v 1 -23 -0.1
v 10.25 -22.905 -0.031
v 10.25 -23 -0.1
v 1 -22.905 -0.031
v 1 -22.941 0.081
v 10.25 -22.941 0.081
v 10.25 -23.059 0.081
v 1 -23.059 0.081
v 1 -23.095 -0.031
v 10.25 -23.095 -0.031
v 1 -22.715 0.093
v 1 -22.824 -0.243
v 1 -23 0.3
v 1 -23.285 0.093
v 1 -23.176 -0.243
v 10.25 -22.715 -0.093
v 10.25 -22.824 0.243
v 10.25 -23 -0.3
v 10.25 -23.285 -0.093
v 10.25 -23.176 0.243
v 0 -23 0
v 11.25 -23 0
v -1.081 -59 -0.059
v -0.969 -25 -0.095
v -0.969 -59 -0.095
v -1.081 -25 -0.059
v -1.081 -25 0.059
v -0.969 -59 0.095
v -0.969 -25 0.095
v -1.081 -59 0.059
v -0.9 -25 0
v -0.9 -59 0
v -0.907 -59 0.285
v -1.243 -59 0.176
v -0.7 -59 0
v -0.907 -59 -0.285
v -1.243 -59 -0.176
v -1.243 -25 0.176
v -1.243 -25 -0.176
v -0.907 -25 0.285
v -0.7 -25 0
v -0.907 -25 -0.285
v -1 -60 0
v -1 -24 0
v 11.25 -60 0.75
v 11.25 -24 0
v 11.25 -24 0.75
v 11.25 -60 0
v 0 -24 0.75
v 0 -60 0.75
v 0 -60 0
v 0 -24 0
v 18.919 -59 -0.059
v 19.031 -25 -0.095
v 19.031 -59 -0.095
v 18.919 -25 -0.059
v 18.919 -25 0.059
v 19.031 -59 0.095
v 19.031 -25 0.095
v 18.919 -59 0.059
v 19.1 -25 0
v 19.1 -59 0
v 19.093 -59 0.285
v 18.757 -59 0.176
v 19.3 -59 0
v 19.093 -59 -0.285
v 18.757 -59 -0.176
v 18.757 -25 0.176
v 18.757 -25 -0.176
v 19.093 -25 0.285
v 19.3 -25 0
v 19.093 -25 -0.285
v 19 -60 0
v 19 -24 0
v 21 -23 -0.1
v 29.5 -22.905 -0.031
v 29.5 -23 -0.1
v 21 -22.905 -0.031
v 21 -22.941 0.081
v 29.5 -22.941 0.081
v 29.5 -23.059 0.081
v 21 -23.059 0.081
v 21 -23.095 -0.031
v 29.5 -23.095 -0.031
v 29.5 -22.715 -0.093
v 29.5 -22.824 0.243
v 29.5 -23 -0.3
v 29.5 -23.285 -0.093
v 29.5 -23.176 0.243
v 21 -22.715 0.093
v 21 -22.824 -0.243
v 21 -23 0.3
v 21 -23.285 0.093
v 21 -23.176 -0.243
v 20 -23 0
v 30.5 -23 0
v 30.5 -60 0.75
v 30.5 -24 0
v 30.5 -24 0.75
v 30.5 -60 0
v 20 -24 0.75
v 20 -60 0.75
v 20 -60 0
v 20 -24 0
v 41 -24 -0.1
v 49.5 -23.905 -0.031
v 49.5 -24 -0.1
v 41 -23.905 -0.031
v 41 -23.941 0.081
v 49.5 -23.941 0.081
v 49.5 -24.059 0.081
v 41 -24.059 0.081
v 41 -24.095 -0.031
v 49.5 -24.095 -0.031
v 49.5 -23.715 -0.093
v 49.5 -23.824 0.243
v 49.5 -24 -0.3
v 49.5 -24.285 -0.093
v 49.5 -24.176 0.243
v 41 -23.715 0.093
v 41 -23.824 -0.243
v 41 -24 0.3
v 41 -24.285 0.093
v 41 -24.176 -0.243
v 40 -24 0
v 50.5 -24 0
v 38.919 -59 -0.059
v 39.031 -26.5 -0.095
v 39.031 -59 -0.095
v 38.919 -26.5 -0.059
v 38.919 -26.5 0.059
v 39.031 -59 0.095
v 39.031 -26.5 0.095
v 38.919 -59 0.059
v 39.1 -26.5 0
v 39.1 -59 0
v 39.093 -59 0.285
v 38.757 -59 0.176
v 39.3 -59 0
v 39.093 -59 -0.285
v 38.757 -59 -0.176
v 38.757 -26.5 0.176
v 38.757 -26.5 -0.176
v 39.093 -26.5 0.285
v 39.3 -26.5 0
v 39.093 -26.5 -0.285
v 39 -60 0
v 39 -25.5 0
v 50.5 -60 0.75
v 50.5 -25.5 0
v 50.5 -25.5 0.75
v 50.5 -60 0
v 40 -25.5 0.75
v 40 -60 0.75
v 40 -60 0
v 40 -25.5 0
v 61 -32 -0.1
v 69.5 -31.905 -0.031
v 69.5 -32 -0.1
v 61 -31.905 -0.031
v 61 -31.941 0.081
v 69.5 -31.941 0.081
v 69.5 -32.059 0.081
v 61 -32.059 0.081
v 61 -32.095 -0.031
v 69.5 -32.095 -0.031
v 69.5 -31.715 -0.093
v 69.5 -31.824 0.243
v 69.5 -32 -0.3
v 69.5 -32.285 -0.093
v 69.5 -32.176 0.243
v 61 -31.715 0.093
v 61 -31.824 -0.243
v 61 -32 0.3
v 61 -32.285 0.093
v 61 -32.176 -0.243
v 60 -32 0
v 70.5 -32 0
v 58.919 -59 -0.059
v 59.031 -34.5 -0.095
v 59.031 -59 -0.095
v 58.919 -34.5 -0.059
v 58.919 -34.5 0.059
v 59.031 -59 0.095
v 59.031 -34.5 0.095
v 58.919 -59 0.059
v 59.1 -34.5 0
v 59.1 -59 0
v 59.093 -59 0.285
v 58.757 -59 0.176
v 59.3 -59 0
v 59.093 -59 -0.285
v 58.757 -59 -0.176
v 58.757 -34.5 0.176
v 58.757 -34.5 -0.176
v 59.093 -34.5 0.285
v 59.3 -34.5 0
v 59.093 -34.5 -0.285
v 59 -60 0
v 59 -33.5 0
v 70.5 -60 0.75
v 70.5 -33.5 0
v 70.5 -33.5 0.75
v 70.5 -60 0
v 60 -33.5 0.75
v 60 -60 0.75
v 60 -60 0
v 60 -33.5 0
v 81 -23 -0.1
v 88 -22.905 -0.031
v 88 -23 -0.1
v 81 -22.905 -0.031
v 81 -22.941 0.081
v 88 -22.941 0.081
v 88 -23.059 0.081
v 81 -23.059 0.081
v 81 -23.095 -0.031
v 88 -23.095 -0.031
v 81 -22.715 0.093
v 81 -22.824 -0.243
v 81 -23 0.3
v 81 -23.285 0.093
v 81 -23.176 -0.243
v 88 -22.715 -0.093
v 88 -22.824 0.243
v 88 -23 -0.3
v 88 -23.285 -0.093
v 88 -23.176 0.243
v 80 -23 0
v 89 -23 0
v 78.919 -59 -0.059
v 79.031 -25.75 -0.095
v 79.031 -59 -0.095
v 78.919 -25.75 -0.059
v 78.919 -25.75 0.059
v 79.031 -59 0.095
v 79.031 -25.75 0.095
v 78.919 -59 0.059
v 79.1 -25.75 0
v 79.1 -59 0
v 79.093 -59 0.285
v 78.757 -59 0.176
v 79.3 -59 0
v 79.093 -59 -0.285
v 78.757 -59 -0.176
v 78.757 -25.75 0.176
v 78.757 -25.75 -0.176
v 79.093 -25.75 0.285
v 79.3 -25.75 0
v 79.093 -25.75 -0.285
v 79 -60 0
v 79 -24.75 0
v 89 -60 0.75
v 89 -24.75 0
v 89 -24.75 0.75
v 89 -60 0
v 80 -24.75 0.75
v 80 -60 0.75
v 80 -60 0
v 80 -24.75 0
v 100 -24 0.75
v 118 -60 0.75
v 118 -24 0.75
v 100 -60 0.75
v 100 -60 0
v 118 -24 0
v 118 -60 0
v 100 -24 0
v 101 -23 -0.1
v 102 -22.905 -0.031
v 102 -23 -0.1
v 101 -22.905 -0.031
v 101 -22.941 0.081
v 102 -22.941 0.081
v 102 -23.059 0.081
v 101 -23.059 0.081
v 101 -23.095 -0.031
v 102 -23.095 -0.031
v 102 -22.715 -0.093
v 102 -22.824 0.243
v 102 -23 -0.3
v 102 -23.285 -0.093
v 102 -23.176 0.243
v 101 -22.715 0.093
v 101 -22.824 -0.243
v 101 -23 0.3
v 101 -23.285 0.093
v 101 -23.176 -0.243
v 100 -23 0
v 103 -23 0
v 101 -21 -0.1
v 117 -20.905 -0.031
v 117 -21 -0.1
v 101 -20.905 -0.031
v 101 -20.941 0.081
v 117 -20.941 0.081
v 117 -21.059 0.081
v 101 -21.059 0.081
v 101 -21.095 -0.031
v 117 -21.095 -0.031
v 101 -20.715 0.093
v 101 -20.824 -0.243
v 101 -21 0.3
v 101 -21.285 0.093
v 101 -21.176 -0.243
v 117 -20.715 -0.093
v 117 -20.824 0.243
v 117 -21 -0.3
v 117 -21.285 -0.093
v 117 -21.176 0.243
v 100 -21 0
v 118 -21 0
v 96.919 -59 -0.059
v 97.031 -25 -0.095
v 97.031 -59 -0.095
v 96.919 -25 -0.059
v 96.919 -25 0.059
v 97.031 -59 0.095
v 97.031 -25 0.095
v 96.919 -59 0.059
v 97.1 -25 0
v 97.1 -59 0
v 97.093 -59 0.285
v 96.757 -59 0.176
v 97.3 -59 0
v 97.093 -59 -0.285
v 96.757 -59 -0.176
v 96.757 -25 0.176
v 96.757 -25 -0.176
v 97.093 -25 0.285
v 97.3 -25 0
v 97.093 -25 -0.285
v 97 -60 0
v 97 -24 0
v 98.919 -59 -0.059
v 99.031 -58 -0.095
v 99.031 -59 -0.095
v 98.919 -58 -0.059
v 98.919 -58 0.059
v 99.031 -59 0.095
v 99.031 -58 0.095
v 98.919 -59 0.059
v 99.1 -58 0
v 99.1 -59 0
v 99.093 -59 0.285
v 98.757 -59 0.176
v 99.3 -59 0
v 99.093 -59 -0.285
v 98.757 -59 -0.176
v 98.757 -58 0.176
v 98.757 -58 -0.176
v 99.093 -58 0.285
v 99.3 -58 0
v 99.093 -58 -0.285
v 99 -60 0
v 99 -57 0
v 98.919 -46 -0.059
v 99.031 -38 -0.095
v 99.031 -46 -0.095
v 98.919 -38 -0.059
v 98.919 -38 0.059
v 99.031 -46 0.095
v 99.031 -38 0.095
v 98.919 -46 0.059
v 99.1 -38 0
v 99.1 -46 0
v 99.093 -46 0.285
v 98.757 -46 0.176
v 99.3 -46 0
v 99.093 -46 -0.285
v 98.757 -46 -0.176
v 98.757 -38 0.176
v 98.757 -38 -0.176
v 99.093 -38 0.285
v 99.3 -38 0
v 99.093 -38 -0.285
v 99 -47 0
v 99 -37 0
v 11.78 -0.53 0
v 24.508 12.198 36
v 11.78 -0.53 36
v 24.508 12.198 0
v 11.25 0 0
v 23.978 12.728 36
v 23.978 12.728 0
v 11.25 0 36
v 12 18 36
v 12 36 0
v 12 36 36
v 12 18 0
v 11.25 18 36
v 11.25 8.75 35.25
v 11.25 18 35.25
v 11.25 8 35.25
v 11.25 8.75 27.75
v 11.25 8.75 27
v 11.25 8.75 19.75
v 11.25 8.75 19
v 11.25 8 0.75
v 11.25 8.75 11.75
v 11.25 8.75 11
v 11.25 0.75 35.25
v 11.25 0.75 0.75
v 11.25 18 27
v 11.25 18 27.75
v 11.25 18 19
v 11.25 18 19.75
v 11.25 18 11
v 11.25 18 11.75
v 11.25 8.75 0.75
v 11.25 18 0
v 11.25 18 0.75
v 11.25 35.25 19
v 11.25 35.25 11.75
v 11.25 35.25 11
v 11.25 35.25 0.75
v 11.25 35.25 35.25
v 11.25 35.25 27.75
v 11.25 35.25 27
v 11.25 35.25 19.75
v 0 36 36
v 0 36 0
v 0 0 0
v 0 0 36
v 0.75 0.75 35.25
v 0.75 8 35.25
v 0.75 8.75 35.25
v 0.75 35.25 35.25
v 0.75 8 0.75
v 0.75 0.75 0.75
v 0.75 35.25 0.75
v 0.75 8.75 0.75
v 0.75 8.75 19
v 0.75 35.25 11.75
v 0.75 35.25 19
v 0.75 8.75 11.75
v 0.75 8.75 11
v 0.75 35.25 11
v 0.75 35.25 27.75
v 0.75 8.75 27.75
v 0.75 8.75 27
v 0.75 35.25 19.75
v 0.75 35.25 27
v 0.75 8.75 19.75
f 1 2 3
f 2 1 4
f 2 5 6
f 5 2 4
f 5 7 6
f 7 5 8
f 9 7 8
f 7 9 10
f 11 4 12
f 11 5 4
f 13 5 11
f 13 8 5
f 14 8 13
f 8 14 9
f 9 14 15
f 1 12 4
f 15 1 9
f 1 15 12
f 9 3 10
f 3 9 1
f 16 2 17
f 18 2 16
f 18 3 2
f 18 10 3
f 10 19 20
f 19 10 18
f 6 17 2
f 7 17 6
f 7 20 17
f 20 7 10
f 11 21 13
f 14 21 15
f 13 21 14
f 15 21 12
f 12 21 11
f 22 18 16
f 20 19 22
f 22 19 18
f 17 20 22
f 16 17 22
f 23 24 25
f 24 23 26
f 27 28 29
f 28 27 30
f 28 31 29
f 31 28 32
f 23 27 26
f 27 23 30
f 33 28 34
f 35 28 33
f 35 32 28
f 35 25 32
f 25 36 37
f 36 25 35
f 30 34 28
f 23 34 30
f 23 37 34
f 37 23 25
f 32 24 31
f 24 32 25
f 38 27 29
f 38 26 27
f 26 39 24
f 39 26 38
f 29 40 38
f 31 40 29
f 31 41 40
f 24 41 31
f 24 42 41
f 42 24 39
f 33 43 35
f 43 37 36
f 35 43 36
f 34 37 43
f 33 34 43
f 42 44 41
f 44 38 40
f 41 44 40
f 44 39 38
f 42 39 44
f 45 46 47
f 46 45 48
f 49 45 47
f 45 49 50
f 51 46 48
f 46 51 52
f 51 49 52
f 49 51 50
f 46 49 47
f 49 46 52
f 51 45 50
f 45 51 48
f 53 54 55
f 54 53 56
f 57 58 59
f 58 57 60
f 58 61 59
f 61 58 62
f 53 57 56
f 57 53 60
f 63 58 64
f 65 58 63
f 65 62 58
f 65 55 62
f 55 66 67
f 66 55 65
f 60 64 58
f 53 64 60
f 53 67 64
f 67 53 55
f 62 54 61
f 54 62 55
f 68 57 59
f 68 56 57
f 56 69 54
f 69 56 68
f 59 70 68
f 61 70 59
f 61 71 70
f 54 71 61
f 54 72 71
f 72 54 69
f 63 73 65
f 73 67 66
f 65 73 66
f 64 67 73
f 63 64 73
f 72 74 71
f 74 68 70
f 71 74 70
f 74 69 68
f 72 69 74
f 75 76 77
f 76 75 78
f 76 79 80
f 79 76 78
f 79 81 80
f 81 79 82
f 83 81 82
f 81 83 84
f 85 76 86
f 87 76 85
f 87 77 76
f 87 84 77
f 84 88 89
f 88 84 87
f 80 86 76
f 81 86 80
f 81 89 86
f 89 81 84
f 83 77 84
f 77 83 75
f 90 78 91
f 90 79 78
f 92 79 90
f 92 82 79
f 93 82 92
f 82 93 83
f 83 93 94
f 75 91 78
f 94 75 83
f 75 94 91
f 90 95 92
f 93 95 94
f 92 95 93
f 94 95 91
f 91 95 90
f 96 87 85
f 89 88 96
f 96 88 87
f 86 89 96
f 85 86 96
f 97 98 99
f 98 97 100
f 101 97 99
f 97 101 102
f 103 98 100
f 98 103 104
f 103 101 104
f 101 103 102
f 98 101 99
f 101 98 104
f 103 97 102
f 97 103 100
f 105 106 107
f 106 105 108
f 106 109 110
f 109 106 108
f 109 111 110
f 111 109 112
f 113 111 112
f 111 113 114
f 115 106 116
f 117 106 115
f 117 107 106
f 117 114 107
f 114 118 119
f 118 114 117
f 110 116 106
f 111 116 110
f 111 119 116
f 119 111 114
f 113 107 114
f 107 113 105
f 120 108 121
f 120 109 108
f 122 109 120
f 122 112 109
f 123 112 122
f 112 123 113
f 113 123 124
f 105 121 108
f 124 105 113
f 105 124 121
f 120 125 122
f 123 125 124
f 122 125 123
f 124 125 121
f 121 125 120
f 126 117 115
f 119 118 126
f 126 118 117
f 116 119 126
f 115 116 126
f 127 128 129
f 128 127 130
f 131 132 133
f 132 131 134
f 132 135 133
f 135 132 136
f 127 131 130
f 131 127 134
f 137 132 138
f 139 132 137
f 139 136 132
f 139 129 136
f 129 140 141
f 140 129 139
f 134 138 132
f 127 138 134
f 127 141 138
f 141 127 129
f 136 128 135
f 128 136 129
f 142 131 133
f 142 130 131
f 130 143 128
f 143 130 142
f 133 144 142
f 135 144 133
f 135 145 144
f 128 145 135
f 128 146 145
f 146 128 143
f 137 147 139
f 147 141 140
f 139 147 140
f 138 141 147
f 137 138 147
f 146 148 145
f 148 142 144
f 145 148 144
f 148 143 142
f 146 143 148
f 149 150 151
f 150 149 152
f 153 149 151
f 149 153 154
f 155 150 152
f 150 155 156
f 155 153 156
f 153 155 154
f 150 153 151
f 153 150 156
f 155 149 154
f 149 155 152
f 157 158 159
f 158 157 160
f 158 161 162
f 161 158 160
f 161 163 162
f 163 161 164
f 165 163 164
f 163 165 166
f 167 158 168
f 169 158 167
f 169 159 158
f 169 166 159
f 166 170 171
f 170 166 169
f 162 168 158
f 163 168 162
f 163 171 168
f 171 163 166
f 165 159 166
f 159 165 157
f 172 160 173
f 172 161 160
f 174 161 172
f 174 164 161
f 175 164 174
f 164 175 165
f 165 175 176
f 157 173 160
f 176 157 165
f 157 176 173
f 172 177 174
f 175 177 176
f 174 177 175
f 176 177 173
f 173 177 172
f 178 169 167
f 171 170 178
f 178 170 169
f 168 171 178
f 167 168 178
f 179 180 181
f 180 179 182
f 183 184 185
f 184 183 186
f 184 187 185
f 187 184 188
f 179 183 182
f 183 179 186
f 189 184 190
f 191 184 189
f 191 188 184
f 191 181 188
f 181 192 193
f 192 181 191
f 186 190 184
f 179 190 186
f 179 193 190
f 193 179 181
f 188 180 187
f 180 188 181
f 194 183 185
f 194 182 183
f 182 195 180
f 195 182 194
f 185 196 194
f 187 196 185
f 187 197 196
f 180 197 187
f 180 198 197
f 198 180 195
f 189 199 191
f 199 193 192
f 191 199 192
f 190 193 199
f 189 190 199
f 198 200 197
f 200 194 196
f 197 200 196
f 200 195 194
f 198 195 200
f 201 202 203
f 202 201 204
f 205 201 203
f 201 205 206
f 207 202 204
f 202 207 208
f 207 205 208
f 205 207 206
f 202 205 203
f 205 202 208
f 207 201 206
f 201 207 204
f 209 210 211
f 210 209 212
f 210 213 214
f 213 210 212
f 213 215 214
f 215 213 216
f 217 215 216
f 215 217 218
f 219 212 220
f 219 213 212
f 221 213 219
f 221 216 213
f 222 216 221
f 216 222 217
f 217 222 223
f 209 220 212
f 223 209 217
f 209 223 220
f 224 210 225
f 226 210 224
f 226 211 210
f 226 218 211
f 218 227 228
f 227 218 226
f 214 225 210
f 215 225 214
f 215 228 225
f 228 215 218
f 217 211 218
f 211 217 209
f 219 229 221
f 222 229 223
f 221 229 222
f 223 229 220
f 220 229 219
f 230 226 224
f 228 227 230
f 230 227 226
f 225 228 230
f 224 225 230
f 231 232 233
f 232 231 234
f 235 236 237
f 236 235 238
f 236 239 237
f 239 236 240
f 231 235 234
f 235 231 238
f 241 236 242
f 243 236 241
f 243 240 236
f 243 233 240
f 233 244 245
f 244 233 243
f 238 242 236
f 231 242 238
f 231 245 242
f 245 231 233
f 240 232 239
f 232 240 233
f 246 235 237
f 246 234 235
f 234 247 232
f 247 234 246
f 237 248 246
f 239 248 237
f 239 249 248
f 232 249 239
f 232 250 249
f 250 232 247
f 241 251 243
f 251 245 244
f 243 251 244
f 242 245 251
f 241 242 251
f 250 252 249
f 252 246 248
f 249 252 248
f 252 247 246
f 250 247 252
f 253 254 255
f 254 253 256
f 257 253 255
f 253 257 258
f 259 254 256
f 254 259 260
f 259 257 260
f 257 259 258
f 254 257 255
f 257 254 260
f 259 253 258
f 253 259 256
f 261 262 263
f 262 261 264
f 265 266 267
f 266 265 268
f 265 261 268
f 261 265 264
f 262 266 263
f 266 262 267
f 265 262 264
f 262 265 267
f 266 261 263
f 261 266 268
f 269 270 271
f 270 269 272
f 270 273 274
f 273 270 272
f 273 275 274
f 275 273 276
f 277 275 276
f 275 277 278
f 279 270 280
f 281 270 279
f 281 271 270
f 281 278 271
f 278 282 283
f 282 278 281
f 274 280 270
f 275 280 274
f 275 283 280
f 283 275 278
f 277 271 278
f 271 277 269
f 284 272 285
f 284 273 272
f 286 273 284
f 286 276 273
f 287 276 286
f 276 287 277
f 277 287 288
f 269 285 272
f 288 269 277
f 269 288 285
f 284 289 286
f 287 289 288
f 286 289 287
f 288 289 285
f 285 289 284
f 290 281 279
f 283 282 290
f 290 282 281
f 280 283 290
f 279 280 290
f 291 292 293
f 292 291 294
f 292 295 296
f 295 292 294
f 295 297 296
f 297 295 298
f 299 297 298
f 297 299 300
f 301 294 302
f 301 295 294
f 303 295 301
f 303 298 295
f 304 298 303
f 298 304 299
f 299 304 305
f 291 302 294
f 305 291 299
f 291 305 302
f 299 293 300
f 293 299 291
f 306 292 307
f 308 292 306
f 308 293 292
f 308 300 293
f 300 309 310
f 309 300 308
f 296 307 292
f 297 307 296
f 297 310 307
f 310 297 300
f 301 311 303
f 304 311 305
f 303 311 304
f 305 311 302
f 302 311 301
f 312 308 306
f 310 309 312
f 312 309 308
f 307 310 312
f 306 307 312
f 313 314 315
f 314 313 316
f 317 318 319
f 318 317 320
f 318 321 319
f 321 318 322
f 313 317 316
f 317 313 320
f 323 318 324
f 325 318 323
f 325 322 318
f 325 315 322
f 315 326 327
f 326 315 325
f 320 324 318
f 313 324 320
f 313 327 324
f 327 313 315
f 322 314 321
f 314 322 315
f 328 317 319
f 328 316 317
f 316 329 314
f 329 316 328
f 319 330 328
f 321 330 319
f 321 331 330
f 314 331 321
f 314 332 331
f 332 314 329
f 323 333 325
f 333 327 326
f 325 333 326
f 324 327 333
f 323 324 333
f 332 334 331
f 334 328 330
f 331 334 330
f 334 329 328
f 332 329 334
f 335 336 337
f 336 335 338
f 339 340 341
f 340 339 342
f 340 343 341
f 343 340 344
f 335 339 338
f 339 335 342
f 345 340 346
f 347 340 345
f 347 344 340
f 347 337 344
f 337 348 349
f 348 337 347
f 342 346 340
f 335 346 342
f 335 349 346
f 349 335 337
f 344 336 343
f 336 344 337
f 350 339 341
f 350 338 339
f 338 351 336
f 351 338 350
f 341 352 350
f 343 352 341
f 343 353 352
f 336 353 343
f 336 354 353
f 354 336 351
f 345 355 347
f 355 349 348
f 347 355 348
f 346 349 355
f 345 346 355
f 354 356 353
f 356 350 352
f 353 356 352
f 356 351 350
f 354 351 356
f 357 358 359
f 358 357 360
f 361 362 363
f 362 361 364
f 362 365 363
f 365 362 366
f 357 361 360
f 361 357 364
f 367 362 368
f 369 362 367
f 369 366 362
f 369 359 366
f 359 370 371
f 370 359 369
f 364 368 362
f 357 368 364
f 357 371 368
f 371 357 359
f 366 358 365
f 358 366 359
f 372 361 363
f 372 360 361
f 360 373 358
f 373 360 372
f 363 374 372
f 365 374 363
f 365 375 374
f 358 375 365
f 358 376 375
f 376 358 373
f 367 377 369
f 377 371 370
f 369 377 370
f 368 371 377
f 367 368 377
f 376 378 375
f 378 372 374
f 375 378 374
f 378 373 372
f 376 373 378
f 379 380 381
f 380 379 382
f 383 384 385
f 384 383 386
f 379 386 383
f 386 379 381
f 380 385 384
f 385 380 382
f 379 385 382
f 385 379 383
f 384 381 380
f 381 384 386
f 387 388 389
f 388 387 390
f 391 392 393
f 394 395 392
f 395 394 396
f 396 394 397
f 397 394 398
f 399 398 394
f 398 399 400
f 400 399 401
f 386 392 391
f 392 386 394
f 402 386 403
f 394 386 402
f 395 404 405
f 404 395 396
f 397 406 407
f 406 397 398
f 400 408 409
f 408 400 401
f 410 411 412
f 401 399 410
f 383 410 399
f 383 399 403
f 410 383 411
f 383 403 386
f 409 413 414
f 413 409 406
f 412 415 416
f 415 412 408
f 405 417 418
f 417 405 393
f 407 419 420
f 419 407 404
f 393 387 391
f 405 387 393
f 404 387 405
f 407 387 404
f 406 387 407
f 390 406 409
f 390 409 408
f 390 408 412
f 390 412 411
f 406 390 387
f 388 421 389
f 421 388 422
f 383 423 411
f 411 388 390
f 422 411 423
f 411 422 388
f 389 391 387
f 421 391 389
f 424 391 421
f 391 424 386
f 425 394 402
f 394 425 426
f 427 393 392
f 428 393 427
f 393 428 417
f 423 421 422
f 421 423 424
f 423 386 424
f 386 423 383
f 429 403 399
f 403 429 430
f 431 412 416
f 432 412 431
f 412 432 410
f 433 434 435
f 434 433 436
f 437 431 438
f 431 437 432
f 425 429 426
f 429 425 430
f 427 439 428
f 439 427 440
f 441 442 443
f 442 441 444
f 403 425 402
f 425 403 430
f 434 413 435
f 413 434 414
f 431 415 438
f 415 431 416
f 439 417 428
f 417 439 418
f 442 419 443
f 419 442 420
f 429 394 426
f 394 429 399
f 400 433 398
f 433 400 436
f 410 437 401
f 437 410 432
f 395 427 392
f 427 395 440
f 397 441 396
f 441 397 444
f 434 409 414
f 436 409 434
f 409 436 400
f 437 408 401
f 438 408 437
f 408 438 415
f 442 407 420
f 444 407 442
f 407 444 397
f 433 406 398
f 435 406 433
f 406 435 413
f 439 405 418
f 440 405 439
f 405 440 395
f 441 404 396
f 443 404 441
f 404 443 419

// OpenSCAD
// file: ../lib/common.scad
//--------------------------------------------------------------------------------------------------
// Module Prism
//--------------------------------------------------------------------------------------------------
module prism(z, y, x)
{
    rotate([0, 90, 0])
    {
        polyhedron(
                points=[[0,0,0], [x,0,0], [x,y,0], [0,y,0], [0,y,z], [x,y,z]],
                faces=[[0,1,2,3],[5,4,3,2],[0,4,5,1],[0,3,4],[5,2,1]]);
    }
    
}

//--------------------------------------------------------------------------------------------------
// Module Side panel
//--------------------------------------------------------------------------------------------------
module rect_cut(x, y, z, dx, dy)
{
    // Top panel
    translate([0, dy, 0])
    {
        cube([x, y - dy, z]);
    };

    // Left bottom panel
    translate([0, 0, 0])
    {
        cube([dx, dy, z]);
    };

    // Triangle
    translate([dx, 0, 0])
    {
        rotate([0, 0, 0])
        {
            prism(x - dx, dy, -z);
        }
    };
}

//--------------------------------------------------------------------------------------------------
// X dimensional arrow
//--------------------------------------------------------------------------------------------------
module arrow_x(l)
{
    line_w = 0.1;
    arrow_w = 1;
    arrow_h = 0.3;

    // Line
    translate([l / 2, 0, 0])
    {
        rotate([0, 90, 0])
        {
            color([0.4, 0.4, 0.4])
            cylinder(l - arrow_w * 2, line_w, line_w, true);
        }
    }

    // Left arrow
    translate([arrow_w, 0, 0])
    {
        rotate([0, 270, 0])
        {
            color([0.4, 0.4, 0.4])
            cylinder(arrow_w, arrow_h, 0, false);
        }
    }

    // Right arrow
    translate([l - arrow_w, 0, 0])
    {
        rotate([0, 90, 0])
        {
            color([0.4, 0.4, 0.4])
            cylinder(arrow_w, arrow_h, 0, false);
        }
    }

    // Text
    translate([l/3, 0.5, 0])
    {
        color([0.4, 0.4, 0.4])
        text(str(l), size=1);
    }
}

//--------------------------------------------------------------------------------------------------
// Y dimensional arrow
//--------------------------------------------------------------------------------------------------
module arrow_y(l)
{
    line_w = 0.1;
    arrow_w = 1;
    arrow_h = 0.3;

    // Line
    translate([0, l / 2, 0])
    {
        rotate([90, 0, 00])
        {
            color([0.4, 0.4, 0.4])
            cylinder(l - arrow_w * 2, line_w, line_w, true);
        }
    }

    // Left arrow
    translate([0 ,arrow_w, 0])
    {
        rotate([90, 0, 0])
        {
            color([0.4, 0.4, 0.4])
            cylinder(arrow_w, arrow_h, 0, false);
        }
    }

    // Right arrow
    translate([0, l - arrow_w, 0])
    {
        rotate([270, 0, 0])
        {
            color([0.4, 0.4, 0.4])
            cylinder(arrow_w, arrow_h, 0, false);
        }
    }

    // Text
    translate([-0.5, l/3, 0])
    {
        rotate([0 ,0, 90])
        {
            color([0.4, 0.4, 0.4])
            text(str(l), size=1);
        }
    }
}

//--------------------------------------------------------------------------------------------------
// Z dimensional arrow
//--------------------------------------------------------------------------------------------------
module arrow_z(l)
{
    line_w = 0.1;
    arrow_w = 1;
    arrow_h = 0.3;

    // Line
    translate([0, 0, l / 2])
    {
        rotate([0, 0, 0])
        {
            color([0.4, 0.4, 0.4])
            cylinder(l - arrow_w * 2, line_w, line_w, true);
        }
    }

    // Left arrow
    translate([0, 0, arrow_w])
    {
        rotate([0, 180, 0])
        {
            color([0.4, 0.4, 0.4])
            cylinder(arrow_w, arrow_h, 0, false);
        }
    }

    // Right arrow
    translate([0, 0, l - arrow_w])
    {
        rotate([0, 0, 0])
        {
            color([0.4, 0.4, 0.4])
            cylinder(arrow_w, arrow_h, 0, false);
        }
    }

    // Text
    translate([0.5, 0, l/3])
    {
        rotate([90 ,0, 90])
        {
            color([0.4, 0.4, 0.4])
            text(str(l), size=1);
        }
    }
}

//--------------------------------------------------------------------------------------------------
// parallelogram
//--------------------------------------------------------------------------------------------------
module parallelogram(x = 12, y = 12, z = 1, xd = 0)
{
    points = [
        [0, 0, 0 ],        //0
        [x, 0, 0 ],        //1
        [x + xd, y, 0],    //2
        [xd, y, 0 ],       //3
        [0, 0, z ],        //4
        [x, 0, z ],        //5
        [x + xd, y, z ],   //6
        [xd, y, z ]];      //7

    faces = [
        [0,1,2,3],         // bottom
        [4,5,1,0],         // front
        [7,6,5,4],         // top
        [5,6,2,1],         // right
        [6,7,3,2],         // back
        [7,4,0,3]];        // left

    polyhedron(points, faces);
}
// main file
include <../lib/common.scad>

//--------------------------------------------------------------------------------------------------
module top_panel()
{
    color([1, 0, 0])
    cube([11.25, 36, 0.75]);
}

//--------------------------------------------------------------------------------------------------
module bottom_panel()
{
    color([0, 1, 1])
    cube([10.5, 36, 0.75]);
}

//--------------------------------------------------------------------------------------------------
module side_panel()
{
    color([0, 1, 0])
    cube([10.5, 34.5, 0.75]);
}

//--------------------------------------------------------------------------------------------------
module board()
{
    color([0, 0, 1])
    cube([10.5, 26.5, 0.75]);
}

//--------------------------------------------------------------------------------------------------
module back_panel()
{
    color([1, 1, 0])
    cube([9, 35.25, 0.75]);
}

//--------------------------------------------------------------------------------------------------
// 18 X 37.5
module door()
{
    translate([0, 3, 0])
    {
        color([1, 0, 1])
        cube([3, 30, 0.75]);
    }

    translate([15, 3, 0])
    {
        color([1, 0, 1])
        cube([3, 30, 0.75]);
    }

    translate([0, 0, 0])
    {
        color([1, 0.5, 0.5])
        cube([18, 3, 0.75]);
    }

    translate([0, 33, 0])
    {
        color([1, 0.5, 0.5])
        cube([18, 3, 0.75]);
    }

    translate([3, 3, 0])
    {
        color([0, 0, 1])
        cube([12, 10, 0.75]);
    }

    translate([3, 13, 0])
    {
        color([0, 0, 0.5])
        cube([12, 10, 0.75]);
    }

    translate([3, 23, 0])
    {
        color([0, 0, 1])
        cube([12, 10, 0.75]);
    }
}

//--------------------------------------------------------------------------------------------------
// Draw Parts
//--------------------------------------------------------------------------------------------------
translate([0, -60, 0])
{
    //----------------------------------------------------------------------------------------------
    // Top panel
    //----------------------------------------------------------------------------------------------
    translate([0, 0, 0])
    {
        top_panel();

        translate([0, 37, 0])
        {
            arrow_x(11.25);
        };

        translate([-1, 0, 0])
        {
            arrow_y(36);
        };
    };

    //----------------------------------------------------------------------------------------------
    // Bottom panel
    //----------------------------------------------------------------------------------------------
    translate([20, 0, 0])
    {
        bottom_panel();

        translate([0, 37, 0])
        {
            arrow_x(10.5);
        };

        translate([-1, 0, 0])
        {
            arrow_y(36);
        };
    };

    //----------------------------------------------------------------------------------------------
    // Side panel
    //----------------------------------------------------------------------------------------------
    translate([40, 0, 0])
    {
        side_panel();

        translate([0, 36, 0])
        {
            arrow_x(10.5);
        };

        translate([-1, 0, 0])
        {
            arrow_y(34.5);
        };
    };

    //----------------------------------------------------------------------------------------------
    // Board
    //----------------------------------------------------------------------------------------------
    translate([60, 0, 0])
    {
        board();

        translate([0, 28, 0])
        {
            arrow_x(10.5);
        };

        translate([-1, 0, 0])
        {
            arrow_y(26.5);
        };
    };

    //----------------------------------------------------------------------------------------------
    // Back panel
    //----------------------------------------------------------------------------------------------
    translate([80, 0, 0])
    {
        back_panel();

        translate([0, 37, 0])
        {
            arrow_x(9);
        };

        translate([-1, 0, 0])
        {
            arrow_y(35.25);
        };
    }

    //----------------------------------------------------------------------------------------------
    // Door
    //----------------------------------------------------------------------------------------------
    translate([100, 0, 0])
    {
        door();

        translate([0, 37, 0])
        {
            arrow_x(3);
        };

        translate([0, 39, 0])
        {
            arrow_x(18);
        };

        translate([-3, 0, 0])
        {
            arrow_y(36);
        };

        translate([-1, 0, 0])
        {
            arrow_y(3);
        };

        translate([-1, 13, 0])
        {
            arrow_y(10);
        };
    };
}


//--------------------------------------------------------------------------------------------------
// Render
//--------------------------------------------------------------------------------------------------
translate([0, 0, 0])
{
    //----------------------------------------------------------------------------------------------
    // Top panel
    //----------------------------------------------------------------------------------------------
    translate([0, 0, 35.25])
    {
        rotate([0, 0, 0])
        {
            top_panel();
        }
    };

    //----------------------------------------------------------------------------------------------
    // Bottom panel
    //----------------------------------------------------------------------------------------------
    translate([0.75, 0, 0])
    {
        rotate([0, 0, 0])
        {
            bottom_panel();
        }
    };

    //----------------------------------------------------------------------------------------------
    // Left side panel
    //----------------------------------------------------------------------------------------------
    translate([0.75, 0.75, 0.75])
    {
        rotate([90, 0, 0])
        {
            side_panel();
        }
    };

    //----------------------------------------------------------------------------------------------
    // Right side panel
    //----------------------------------------------------------------------------------------------
    translate([0.75, 36, 0.75])
    {
        rotate([90, 0, 0])
        {
            side_panel();
        }
    };

    //----------------------------------------------------------------------------------------------
    // Mid side panel
    //----------------------------------------------------------------------------------------------
    translate([0.75, 8.75, 0.75])
    {
        rotate([90, 0, 0])
        {
            side_panel();
        }
    };

    //----------------------------------------------------------------------------------------------
    // Board 0
    //----------------------------------------------------------------------------------------------
    translate([0.75, 8.75, 11])
    {
        rotate([0, 0, 0])
        {
            board();
        }
    };

    //----------------------------------------------------------------------------------------------
    // Board 1
    //----------------------------------------------------------------------------------------------
    translate([0.75, 8.75, 19])
    {
        rotate([0, 0, 0])
        {
            board();
        }
    };

    //----------------------------------------------------------------------------------------------
    // Board 2
    //----------------------------------------------------------------------------------------------
    translate([0.75, 8.75, 27])
    {
        rotate([0, 0, 0])
        {
            board();
        }
    };

    //----------------------------------------------------------------------------------------------
    // Back panel 0
    //----------------------------------------------------------------------------------------------
    translate([0, 0, 0])
    {
        rotate([90, 0, 90])
        {
            back_panel();
        }
    };

    //----------------------------------------------------------------------------------------------
    // Back panel 1
    //----------------------------------------------------------------------------------------------
    translate([0, 9, 0])
    {
        rotate([90, 0, 90])
        {
            back_panel();
        }
    };

    //----------------------------------------------------------------------------------------------
    // Back panel 2
    //----------------------------------------------------------------------------------------------
    translate([0, 18, 0])
    {
        rotate([90, 0, 90])
        {
            back_panel();
        }
    };

    //----------------------------------------------------------------------------------------------
    // Back panel 3
    //----------------------------------------------------------------------------------------------
    translate([0, 27, 0])
    {
        rotate([90, 0, 90])
        {
            back_panel();
        }
    };


    //----------------------------------------------------------------------------------------------
    // L Door
    //----------------------------------------------------------------------------------------------
    translate([11.25, 0, 0])
    {
        rotate([90, 0, 45])
        {
            door();
        }
    };

    //----------------------------------------------------------------------------------------------
    // R Door
    //----------------------------------------------------------------------------------------------
    translate([11.25, 18, 0])
    {
        rotate([90, 0, 90])
        {
            door();
        }
    };
}
